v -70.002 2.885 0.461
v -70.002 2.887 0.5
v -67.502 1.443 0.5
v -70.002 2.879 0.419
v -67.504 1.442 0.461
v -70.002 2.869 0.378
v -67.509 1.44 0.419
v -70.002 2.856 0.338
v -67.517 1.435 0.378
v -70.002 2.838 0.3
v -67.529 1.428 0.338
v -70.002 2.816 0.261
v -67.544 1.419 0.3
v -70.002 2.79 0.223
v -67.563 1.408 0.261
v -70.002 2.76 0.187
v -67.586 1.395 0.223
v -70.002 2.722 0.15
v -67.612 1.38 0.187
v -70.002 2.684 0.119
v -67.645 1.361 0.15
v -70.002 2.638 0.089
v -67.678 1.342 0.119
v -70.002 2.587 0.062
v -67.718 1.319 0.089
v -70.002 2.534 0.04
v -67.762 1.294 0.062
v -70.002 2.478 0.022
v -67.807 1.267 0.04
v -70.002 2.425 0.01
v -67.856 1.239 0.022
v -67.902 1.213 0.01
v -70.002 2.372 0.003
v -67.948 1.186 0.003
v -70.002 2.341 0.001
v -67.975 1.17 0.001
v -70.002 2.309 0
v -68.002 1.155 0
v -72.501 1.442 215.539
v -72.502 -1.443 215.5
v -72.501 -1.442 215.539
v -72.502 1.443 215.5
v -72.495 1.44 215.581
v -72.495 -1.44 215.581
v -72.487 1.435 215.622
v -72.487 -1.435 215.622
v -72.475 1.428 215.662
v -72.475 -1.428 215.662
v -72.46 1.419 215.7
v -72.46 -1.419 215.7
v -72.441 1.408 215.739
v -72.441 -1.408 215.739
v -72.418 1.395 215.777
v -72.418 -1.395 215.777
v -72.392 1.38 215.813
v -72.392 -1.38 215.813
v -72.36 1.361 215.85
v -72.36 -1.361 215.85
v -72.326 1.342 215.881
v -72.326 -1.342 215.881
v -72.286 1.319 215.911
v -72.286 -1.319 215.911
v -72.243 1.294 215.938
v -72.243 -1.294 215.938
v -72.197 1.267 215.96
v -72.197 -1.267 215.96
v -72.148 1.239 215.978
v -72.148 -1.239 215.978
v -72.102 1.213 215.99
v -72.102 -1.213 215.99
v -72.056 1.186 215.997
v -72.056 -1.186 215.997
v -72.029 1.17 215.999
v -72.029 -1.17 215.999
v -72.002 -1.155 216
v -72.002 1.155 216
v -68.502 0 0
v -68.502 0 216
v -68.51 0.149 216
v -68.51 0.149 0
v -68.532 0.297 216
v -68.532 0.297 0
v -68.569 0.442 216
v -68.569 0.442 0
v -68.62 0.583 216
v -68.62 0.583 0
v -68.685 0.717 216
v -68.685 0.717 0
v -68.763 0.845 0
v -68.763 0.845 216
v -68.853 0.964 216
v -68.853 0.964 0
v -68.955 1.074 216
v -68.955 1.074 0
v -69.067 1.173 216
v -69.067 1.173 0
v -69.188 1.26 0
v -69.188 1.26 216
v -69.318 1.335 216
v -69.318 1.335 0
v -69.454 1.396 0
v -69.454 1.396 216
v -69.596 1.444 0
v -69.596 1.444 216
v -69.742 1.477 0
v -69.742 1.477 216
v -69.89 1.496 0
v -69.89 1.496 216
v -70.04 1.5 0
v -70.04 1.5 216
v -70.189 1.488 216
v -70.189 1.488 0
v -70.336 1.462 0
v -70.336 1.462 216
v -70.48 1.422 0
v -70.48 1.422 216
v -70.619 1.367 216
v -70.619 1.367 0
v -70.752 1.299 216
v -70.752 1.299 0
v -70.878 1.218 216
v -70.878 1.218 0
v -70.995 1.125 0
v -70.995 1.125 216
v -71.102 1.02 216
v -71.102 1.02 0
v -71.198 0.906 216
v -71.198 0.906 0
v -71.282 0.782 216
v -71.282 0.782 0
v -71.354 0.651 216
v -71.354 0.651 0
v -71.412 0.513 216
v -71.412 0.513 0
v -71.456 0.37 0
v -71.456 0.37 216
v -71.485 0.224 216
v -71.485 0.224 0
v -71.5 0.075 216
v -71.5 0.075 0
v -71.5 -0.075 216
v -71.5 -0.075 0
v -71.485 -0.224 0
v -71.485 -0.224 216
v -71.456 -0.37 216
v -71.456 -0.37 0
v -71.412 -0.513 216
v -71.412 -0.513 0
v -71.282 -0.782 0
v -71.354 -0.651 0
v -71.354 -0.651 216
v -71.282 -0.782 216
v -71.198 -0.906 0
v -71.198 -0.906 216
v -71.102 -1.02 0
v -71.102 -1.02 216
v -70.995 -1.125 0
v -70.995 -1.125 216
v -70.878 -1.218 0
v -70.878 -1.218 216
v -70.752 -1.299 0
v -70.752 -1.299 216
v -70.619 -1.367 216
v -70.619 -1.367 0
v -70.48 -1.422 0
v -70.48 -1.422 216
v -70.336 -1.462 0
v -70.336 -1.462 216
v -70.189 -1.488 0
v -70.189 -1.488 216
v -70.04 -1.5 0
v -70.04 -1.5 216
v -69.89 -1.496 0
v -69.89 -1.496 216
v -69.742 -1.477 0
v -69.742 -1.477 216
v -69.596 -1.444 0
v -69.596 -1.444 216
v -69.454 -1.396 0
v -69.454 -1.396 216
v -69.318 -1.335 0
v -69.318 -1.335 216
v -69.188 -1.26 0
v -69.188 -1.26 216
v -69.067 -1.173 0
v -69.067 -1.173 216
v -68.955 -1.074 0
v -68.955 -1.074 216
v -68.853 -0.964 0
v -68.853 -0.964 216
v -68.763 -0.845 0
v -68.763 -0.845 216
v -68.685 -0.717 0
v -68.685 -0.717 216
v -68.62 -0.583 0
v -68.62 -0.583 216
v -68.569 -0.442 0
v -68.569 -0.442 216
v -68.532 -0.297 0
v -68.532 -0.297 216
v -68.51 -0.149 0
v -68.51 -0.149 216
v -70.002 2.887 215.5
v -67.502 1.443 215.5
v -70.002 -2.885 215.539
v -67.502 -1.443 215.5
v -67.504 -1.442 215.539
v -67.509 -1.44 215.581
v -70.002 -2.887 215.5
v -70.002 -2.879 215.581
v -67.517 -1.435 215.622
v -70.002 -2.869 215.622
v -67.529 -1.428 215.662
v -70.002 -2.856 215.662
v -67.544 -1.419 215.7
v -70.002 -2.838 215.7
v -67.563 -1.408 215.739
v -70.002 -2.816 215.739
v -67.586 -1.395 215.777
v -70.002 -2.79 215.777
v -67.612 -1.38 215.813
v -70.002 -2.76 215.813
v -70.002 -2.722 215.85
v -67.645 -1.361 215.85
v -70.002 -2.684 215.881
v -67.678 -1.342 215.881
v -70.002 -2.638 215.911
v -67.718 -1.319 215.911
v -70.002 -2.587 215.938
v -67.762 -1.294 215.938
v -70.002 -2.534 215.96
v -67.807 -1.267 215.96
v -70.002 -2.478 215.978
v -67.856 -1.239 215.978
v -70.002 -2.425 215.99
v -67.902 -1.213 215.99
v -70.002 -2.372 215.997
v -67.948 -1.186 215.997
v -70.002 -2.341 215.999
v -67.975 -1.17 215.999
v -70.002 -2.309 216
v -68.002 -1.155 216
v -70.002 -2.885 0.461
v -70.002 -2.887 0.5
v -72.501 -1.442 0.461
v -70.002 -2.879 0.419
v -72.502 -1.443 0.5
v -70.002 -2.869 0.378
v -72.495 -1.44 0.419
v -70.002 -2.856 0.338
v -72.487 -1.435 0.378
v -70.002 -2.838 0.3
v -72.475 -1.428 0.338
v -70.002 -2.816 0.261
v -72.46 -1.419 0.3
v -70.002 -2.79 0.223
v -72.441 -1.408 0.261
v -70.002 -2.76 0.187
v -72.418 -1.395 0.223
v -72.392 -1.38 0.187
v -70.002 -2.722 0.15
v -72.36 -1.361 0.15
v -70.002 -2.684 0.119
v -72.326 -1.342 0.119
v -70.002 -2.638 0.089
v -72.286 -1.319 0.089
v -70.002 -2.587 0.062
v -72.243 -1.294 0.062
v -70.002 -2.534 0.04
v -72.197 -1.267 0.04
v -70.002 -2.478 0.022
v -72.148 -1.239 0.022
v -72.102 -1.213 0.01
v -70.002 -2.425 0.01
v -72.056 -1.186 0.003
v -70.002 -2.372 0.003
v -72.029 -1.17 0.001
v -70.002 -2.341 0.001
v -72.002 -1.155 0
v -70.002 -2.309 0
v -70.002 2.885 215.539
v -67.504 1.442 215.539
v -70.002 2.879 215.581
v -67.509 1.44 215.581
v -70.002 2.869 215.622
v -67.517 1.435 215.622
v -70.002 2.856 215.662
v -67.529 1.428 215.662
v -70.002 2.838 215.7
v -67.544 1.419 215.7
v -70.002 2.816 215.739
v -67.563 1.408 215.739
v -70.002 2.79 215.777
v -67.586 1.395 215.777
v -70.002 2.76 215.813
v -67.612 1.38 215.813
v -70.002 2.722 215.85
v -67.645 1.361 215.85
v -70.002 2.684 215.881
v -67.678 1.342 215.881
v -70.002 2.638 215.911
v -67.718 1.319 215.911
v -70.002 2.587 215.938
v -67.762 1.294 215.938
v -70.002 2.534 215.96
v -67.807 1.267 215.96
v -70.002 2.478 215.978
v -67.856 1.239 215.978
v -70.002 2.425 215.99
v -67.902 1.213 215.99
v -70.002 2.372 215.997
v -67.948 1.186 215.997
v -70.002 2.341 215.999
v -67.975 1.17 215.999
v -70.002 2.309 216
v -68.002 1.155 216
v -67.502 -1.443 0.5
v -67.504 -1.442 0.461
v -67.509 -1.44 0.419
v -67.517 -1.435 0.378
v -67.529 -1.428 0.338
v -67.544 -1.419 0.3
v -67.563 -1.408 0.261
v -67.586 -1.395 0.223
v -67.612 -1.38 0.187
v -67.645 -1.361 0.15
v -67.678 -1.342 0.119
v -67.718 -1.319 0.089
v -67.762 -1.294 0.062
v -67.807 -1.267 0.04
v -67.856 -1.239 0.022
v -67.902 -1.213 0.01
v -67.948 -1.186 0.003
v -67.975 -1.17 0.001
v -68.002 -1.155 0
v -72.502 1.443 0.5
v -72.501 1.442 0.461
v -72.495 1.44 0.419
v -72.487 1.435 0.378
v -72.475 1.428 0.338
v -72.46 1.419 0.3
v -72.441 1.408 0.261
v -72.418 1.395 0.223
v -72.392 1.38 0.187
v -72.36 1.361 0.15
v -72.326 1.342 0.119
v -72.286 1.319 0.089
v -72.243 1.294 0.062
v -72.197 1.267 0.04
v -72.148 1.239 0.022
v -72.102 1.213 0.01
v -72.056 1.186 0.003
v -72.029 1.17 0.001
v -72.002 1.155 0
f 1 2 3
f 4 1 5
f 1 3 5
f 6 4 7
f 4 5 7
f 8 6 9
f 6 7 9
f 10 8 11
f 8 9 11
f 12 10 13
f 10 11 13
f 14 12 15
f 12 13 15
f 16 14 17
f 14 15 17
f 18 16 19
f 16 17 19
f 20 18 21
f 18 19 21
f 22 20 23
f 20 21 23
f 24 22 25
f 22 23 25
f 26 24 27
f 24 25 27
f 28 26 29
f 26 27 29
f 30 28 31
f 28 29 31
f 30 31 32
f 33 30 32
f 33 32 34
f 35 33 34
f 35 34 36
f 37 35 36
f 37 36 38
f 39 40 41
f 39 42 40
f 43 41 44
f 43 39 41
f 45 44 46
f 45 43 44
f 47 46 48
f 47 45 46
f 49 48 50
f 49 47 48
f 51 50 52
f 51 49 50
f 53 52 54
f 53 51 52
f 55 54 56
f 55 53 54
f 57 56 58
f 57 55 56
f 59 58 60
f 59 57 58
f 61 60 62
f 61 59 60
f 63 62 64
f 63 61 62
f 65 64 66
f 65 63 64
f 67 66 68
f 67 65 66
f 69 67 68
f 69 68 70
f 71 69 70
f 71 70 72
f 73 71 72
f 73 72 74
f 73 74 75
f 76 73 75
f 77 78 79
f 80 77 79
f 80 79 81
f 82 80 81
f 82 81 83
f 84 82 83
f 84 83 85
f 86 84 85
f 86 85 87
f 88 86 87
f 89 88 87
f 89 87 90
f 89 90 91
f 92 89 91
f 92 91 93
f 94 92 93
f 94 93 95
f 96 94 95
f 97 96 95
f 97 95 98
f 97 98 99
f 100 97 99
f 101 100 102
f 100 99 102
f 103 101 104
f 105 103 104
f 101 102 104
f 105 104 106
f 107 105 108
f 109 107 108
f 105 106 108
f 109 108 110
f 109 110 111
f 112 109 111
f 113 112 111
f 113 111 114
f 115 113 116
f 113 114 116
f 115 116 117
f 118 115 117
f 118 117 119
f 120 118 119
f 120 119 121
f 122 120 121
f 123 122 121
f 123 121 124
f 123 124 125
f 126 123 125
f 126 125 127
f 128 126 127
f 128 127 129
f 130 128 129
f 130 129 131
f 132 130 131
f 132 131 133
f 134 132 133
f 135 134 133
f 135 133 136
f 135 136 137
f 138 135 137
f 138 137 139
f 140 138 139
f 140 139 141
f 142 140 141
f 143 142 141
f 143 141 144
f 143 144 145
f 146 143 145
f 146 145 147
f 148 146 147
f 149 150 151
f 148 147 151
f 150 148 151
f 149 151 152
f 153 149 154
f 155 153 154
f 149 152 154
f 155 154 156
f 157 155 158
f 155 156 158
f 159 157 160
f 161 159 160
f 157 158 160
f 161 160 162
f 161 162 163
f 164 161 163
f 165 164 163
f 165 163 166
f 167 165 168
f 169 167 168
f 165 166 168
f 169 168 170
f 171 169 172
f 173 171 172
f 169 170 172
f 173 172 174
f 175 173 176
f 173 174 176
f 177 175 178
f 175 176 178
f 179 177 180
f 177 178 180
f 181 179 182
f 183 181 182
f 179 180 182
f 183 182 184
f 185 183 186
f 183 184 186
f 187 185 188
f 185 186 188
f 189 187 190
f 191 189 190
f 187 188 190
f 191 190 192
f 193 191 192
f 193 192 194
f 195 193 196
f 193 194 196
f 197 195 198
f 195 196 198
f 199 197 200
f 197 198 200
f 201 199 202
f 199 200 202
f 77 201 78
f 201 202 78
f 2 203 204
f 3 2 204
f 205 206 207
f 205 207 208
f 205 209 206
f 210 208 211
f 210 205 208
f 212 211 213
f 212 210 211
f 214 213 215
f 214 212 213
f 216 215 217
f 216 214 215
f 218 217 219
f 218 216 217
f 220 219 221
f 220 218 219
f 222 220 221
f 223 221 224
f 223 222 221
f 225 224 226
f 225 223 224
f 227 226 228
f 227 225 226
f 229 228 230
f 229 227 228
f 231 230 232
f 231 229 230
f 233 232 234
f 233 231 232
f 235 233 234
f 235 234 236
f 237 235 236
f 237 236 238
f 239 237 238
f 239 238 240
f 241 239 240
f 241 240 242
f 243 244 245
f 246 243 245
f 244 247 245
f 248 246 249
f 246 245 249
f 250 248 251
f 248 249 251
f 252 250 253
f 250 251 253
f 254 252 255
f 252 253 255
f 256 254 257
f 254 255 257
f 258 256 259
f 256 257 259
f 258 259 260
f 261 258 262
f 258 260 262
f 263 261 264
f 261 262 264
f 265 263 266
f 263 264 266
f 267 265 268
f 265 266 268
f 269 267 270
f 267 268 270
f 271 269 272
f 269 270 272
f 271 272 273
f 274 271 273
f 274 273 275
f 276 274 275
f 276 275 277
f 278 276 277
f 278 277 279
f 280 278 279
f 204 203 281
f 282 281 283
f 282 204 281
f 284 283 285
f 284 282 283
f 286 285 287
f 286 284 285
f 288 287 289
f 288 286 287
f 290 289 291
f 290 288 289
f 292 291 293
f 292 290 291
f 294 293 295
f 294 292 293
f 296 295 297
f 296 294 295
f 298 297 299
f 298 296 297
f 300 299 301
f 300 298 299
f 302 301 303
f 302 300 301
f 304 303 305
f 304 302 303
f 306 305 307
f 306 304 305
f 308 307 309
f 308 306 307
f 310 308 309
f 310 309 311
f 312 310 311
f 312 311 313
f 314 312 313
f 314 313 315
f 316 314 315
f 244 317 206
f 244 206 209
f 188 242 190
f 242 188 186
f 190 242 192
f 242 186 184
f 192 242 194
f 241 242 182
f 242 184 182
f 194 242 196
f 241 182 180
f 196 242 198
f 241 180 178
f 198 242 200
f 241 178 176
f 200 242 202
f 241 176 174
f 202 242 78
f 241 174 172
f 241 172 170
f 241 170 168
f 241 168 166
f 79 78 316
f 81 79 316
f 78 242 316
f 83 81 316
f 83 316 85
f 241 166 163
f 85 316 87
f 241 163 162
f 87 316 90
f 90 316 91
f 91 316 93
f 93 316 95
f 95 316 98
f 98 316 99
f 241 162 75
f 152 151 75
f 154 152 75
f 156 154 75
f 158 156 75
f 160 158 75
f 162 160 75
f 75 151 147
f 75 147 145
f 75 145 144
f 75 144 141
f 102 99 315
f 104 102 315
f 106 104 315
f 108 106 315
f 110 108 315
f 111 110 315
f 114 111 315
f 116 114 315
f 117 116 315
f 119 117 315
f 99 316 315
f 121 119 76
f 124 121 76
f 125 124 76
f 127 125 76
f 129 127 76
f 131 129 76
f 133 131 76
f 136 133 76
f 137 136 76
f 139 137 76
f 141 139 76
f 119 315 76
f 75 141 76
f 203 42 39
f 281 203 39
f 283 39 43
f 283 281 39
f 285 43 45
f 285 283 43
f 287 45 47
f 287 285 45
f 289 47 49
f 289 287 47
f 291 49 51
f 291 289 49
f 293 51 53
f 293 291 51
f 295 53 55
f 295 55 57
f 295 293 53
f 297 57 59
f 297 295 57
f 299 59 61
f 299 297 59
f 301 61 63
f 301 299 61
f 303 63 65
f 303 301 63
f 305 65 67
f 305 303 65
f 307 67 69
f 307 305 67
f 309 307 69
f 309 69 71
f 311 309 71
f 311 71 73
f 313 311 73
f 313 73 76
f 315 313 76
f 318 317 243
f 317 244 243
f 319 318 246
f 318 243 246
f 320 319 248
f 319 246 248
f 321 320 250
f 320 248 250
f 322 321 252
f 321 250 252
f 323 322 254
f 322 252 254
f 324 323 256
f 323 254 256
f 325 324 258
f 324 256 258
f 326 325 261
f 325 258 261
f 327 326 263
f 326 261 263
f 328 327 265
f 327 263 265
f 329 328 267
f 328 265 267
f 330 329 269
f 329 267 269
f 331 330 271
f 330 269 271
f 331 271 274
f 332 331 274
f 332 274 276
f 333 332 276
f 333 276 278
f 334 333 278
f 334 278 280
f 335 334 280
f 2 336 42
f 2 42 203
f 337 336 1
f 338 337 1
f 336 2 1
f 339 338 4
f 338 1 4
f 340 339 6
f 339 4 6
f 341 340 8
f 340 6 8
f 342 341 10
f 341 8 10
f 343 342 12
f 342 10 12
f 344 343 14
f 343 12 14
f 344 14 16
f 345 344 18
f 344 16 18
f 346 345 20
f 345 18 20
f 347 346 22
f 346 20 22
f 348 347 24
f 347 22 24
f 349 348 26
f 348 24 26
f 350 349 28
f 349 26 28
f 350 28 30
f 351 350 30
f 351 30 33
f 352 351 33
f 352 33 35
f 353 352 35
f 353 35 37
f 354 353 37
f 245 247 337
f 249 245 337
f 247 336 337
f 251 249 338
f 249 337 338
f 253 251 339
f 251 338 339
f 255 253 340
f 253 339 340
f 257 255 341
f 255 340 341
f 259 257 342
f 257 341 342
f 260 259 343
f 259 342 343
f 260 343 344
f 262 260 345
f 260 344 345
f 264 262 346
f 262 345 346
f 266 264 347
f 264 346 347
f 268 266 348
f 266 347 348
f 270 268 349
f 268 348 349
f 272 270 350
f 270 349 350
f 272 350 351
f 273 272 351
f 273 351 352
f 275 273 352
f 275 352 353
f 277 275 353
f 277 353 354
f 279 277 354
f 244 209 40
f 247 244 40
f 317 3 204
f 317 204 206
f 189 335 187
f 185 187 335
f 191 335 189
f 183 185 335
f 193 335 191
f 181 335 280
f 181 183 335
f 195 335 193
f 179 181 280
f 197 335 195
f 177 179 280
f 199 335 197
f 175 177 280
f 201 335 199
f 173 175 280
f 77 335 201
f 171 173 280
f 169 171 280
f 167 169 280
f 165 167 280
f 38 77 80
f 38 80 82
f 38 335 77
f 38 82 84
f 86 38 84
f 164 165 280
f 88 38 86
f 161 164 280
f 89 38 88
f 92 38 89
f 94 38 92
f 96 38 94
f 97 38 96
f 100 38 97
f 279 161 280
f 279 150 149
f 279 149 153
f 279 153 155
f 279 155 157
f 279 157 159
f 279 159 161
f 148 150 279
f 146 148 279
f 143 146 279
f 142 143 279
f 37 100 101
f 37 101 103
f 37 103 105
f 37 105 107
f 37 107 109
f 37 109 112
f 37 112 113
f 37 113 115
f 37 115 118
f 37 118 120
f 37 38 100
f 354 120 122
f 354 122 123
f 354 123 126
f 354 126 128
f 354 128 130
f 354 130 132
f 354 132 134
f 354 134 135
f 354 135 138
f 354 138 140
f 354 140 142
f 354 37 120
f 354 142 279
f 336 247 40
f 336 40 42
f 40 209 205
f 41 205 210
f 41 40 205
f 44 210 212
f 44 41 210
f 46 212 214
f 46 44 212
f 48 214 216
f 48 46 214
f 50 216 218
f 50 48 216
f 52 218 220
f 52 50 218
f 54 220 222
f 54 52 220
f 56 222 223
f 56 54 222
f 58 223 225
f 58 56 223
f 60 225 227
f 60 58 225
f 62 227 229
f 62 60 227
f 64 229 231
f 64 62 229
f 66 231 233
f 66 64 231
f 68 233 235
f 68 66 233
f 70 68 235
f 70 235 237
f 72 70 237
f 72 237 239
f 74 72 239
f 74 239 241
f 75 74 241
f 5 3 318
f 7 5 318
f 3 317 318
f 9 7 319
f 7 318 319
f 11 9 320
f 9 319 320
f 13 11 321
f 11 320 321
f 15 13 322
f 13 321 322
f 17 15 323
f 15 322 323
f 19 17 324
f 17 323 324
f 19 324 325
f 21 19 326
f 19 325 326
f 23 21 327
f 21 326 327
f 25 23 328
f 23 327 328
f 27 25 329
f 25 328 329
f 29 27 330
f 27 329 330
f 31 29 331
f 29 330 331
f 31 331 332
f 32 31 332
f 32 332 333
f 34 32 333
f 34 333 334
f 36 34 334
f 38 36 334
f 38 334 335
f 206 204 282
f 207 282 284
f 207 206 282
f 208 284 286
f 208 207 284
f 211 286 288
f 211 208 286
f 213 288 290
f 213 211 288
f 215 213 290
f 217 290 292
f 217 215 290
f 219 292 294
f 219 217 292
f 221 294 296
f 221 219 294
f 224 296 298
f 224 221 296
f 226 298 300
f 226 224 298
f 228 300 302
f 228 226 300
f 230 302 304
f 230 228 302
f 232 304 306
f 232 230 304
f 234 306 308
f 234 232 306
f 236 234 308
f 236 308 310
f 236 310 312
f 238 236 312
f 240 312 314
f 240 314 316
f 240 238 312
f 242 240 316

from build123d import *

# Parameters (mm, degrees)
RESSALTO_EXTRUS_O1_DEPTH = 216
FILETE1_R                = 0.5
ESBO_O2_R                = 1.5
CORTE_EXTRUS_O1_DEPTH    = 217


with BuildPart() as part:
    # Esboço1 → Ressalto-extrusão1 (new body)
    with BuildSketch(Plane(origin=(0, 0, 0), x_dir=(-1, 0, 0), z_dir=(0, 0, -1))):
        Polygon((67.502122675, -1.443375673), (70.002122675, -2.886751346), (72.502122675, -1.443375673), (72.502122675, 1.443375673), (70.002122675, 2.886751346), (67.502122675, 1.443375673), align=None)
    extrude(amount=-RESSALTO_EXTRUS_O1_DEPTH)

    # Filete1
    filete1_edges = [part.edges().sort_by_distance(p)[0] for p in [
        (-71.252122675, -2.165063509, 216),
        (-72.502122675, 0, 216),
        (-71.252122675, 2.165063509, 216),
        (-68.752122675, 2.165063509, 216),
        (-67.502122675, 0, 216),
        (-68.752122675, 2.165063509, 0),
        (-71.252122675, 2.165063509, 0),
        (-72.502122675, 0, 0),
        (-71.252122675, -2.165063509, 0),
        (-68.752122675, -2.165063509, 0),
        (-67.502122675, 0, 0),
        (-68.752122675, -2.165063509, 216),
    ]]
    fillet(filete1_edges, radius=FILETE1_R)

    # Esboço2 → Corte-extrusão1 (cut, through all)
    with BuildSketch(Plane.XY.offset(216)):
        with Locations((-70.002122675, 0)):
            Circle(ESBO_O2_R)
    extrude(amount=-CORTE_EXTRUS_O1_DEPTH, mode=Mode.SUBTRACT)


solid = part.part
